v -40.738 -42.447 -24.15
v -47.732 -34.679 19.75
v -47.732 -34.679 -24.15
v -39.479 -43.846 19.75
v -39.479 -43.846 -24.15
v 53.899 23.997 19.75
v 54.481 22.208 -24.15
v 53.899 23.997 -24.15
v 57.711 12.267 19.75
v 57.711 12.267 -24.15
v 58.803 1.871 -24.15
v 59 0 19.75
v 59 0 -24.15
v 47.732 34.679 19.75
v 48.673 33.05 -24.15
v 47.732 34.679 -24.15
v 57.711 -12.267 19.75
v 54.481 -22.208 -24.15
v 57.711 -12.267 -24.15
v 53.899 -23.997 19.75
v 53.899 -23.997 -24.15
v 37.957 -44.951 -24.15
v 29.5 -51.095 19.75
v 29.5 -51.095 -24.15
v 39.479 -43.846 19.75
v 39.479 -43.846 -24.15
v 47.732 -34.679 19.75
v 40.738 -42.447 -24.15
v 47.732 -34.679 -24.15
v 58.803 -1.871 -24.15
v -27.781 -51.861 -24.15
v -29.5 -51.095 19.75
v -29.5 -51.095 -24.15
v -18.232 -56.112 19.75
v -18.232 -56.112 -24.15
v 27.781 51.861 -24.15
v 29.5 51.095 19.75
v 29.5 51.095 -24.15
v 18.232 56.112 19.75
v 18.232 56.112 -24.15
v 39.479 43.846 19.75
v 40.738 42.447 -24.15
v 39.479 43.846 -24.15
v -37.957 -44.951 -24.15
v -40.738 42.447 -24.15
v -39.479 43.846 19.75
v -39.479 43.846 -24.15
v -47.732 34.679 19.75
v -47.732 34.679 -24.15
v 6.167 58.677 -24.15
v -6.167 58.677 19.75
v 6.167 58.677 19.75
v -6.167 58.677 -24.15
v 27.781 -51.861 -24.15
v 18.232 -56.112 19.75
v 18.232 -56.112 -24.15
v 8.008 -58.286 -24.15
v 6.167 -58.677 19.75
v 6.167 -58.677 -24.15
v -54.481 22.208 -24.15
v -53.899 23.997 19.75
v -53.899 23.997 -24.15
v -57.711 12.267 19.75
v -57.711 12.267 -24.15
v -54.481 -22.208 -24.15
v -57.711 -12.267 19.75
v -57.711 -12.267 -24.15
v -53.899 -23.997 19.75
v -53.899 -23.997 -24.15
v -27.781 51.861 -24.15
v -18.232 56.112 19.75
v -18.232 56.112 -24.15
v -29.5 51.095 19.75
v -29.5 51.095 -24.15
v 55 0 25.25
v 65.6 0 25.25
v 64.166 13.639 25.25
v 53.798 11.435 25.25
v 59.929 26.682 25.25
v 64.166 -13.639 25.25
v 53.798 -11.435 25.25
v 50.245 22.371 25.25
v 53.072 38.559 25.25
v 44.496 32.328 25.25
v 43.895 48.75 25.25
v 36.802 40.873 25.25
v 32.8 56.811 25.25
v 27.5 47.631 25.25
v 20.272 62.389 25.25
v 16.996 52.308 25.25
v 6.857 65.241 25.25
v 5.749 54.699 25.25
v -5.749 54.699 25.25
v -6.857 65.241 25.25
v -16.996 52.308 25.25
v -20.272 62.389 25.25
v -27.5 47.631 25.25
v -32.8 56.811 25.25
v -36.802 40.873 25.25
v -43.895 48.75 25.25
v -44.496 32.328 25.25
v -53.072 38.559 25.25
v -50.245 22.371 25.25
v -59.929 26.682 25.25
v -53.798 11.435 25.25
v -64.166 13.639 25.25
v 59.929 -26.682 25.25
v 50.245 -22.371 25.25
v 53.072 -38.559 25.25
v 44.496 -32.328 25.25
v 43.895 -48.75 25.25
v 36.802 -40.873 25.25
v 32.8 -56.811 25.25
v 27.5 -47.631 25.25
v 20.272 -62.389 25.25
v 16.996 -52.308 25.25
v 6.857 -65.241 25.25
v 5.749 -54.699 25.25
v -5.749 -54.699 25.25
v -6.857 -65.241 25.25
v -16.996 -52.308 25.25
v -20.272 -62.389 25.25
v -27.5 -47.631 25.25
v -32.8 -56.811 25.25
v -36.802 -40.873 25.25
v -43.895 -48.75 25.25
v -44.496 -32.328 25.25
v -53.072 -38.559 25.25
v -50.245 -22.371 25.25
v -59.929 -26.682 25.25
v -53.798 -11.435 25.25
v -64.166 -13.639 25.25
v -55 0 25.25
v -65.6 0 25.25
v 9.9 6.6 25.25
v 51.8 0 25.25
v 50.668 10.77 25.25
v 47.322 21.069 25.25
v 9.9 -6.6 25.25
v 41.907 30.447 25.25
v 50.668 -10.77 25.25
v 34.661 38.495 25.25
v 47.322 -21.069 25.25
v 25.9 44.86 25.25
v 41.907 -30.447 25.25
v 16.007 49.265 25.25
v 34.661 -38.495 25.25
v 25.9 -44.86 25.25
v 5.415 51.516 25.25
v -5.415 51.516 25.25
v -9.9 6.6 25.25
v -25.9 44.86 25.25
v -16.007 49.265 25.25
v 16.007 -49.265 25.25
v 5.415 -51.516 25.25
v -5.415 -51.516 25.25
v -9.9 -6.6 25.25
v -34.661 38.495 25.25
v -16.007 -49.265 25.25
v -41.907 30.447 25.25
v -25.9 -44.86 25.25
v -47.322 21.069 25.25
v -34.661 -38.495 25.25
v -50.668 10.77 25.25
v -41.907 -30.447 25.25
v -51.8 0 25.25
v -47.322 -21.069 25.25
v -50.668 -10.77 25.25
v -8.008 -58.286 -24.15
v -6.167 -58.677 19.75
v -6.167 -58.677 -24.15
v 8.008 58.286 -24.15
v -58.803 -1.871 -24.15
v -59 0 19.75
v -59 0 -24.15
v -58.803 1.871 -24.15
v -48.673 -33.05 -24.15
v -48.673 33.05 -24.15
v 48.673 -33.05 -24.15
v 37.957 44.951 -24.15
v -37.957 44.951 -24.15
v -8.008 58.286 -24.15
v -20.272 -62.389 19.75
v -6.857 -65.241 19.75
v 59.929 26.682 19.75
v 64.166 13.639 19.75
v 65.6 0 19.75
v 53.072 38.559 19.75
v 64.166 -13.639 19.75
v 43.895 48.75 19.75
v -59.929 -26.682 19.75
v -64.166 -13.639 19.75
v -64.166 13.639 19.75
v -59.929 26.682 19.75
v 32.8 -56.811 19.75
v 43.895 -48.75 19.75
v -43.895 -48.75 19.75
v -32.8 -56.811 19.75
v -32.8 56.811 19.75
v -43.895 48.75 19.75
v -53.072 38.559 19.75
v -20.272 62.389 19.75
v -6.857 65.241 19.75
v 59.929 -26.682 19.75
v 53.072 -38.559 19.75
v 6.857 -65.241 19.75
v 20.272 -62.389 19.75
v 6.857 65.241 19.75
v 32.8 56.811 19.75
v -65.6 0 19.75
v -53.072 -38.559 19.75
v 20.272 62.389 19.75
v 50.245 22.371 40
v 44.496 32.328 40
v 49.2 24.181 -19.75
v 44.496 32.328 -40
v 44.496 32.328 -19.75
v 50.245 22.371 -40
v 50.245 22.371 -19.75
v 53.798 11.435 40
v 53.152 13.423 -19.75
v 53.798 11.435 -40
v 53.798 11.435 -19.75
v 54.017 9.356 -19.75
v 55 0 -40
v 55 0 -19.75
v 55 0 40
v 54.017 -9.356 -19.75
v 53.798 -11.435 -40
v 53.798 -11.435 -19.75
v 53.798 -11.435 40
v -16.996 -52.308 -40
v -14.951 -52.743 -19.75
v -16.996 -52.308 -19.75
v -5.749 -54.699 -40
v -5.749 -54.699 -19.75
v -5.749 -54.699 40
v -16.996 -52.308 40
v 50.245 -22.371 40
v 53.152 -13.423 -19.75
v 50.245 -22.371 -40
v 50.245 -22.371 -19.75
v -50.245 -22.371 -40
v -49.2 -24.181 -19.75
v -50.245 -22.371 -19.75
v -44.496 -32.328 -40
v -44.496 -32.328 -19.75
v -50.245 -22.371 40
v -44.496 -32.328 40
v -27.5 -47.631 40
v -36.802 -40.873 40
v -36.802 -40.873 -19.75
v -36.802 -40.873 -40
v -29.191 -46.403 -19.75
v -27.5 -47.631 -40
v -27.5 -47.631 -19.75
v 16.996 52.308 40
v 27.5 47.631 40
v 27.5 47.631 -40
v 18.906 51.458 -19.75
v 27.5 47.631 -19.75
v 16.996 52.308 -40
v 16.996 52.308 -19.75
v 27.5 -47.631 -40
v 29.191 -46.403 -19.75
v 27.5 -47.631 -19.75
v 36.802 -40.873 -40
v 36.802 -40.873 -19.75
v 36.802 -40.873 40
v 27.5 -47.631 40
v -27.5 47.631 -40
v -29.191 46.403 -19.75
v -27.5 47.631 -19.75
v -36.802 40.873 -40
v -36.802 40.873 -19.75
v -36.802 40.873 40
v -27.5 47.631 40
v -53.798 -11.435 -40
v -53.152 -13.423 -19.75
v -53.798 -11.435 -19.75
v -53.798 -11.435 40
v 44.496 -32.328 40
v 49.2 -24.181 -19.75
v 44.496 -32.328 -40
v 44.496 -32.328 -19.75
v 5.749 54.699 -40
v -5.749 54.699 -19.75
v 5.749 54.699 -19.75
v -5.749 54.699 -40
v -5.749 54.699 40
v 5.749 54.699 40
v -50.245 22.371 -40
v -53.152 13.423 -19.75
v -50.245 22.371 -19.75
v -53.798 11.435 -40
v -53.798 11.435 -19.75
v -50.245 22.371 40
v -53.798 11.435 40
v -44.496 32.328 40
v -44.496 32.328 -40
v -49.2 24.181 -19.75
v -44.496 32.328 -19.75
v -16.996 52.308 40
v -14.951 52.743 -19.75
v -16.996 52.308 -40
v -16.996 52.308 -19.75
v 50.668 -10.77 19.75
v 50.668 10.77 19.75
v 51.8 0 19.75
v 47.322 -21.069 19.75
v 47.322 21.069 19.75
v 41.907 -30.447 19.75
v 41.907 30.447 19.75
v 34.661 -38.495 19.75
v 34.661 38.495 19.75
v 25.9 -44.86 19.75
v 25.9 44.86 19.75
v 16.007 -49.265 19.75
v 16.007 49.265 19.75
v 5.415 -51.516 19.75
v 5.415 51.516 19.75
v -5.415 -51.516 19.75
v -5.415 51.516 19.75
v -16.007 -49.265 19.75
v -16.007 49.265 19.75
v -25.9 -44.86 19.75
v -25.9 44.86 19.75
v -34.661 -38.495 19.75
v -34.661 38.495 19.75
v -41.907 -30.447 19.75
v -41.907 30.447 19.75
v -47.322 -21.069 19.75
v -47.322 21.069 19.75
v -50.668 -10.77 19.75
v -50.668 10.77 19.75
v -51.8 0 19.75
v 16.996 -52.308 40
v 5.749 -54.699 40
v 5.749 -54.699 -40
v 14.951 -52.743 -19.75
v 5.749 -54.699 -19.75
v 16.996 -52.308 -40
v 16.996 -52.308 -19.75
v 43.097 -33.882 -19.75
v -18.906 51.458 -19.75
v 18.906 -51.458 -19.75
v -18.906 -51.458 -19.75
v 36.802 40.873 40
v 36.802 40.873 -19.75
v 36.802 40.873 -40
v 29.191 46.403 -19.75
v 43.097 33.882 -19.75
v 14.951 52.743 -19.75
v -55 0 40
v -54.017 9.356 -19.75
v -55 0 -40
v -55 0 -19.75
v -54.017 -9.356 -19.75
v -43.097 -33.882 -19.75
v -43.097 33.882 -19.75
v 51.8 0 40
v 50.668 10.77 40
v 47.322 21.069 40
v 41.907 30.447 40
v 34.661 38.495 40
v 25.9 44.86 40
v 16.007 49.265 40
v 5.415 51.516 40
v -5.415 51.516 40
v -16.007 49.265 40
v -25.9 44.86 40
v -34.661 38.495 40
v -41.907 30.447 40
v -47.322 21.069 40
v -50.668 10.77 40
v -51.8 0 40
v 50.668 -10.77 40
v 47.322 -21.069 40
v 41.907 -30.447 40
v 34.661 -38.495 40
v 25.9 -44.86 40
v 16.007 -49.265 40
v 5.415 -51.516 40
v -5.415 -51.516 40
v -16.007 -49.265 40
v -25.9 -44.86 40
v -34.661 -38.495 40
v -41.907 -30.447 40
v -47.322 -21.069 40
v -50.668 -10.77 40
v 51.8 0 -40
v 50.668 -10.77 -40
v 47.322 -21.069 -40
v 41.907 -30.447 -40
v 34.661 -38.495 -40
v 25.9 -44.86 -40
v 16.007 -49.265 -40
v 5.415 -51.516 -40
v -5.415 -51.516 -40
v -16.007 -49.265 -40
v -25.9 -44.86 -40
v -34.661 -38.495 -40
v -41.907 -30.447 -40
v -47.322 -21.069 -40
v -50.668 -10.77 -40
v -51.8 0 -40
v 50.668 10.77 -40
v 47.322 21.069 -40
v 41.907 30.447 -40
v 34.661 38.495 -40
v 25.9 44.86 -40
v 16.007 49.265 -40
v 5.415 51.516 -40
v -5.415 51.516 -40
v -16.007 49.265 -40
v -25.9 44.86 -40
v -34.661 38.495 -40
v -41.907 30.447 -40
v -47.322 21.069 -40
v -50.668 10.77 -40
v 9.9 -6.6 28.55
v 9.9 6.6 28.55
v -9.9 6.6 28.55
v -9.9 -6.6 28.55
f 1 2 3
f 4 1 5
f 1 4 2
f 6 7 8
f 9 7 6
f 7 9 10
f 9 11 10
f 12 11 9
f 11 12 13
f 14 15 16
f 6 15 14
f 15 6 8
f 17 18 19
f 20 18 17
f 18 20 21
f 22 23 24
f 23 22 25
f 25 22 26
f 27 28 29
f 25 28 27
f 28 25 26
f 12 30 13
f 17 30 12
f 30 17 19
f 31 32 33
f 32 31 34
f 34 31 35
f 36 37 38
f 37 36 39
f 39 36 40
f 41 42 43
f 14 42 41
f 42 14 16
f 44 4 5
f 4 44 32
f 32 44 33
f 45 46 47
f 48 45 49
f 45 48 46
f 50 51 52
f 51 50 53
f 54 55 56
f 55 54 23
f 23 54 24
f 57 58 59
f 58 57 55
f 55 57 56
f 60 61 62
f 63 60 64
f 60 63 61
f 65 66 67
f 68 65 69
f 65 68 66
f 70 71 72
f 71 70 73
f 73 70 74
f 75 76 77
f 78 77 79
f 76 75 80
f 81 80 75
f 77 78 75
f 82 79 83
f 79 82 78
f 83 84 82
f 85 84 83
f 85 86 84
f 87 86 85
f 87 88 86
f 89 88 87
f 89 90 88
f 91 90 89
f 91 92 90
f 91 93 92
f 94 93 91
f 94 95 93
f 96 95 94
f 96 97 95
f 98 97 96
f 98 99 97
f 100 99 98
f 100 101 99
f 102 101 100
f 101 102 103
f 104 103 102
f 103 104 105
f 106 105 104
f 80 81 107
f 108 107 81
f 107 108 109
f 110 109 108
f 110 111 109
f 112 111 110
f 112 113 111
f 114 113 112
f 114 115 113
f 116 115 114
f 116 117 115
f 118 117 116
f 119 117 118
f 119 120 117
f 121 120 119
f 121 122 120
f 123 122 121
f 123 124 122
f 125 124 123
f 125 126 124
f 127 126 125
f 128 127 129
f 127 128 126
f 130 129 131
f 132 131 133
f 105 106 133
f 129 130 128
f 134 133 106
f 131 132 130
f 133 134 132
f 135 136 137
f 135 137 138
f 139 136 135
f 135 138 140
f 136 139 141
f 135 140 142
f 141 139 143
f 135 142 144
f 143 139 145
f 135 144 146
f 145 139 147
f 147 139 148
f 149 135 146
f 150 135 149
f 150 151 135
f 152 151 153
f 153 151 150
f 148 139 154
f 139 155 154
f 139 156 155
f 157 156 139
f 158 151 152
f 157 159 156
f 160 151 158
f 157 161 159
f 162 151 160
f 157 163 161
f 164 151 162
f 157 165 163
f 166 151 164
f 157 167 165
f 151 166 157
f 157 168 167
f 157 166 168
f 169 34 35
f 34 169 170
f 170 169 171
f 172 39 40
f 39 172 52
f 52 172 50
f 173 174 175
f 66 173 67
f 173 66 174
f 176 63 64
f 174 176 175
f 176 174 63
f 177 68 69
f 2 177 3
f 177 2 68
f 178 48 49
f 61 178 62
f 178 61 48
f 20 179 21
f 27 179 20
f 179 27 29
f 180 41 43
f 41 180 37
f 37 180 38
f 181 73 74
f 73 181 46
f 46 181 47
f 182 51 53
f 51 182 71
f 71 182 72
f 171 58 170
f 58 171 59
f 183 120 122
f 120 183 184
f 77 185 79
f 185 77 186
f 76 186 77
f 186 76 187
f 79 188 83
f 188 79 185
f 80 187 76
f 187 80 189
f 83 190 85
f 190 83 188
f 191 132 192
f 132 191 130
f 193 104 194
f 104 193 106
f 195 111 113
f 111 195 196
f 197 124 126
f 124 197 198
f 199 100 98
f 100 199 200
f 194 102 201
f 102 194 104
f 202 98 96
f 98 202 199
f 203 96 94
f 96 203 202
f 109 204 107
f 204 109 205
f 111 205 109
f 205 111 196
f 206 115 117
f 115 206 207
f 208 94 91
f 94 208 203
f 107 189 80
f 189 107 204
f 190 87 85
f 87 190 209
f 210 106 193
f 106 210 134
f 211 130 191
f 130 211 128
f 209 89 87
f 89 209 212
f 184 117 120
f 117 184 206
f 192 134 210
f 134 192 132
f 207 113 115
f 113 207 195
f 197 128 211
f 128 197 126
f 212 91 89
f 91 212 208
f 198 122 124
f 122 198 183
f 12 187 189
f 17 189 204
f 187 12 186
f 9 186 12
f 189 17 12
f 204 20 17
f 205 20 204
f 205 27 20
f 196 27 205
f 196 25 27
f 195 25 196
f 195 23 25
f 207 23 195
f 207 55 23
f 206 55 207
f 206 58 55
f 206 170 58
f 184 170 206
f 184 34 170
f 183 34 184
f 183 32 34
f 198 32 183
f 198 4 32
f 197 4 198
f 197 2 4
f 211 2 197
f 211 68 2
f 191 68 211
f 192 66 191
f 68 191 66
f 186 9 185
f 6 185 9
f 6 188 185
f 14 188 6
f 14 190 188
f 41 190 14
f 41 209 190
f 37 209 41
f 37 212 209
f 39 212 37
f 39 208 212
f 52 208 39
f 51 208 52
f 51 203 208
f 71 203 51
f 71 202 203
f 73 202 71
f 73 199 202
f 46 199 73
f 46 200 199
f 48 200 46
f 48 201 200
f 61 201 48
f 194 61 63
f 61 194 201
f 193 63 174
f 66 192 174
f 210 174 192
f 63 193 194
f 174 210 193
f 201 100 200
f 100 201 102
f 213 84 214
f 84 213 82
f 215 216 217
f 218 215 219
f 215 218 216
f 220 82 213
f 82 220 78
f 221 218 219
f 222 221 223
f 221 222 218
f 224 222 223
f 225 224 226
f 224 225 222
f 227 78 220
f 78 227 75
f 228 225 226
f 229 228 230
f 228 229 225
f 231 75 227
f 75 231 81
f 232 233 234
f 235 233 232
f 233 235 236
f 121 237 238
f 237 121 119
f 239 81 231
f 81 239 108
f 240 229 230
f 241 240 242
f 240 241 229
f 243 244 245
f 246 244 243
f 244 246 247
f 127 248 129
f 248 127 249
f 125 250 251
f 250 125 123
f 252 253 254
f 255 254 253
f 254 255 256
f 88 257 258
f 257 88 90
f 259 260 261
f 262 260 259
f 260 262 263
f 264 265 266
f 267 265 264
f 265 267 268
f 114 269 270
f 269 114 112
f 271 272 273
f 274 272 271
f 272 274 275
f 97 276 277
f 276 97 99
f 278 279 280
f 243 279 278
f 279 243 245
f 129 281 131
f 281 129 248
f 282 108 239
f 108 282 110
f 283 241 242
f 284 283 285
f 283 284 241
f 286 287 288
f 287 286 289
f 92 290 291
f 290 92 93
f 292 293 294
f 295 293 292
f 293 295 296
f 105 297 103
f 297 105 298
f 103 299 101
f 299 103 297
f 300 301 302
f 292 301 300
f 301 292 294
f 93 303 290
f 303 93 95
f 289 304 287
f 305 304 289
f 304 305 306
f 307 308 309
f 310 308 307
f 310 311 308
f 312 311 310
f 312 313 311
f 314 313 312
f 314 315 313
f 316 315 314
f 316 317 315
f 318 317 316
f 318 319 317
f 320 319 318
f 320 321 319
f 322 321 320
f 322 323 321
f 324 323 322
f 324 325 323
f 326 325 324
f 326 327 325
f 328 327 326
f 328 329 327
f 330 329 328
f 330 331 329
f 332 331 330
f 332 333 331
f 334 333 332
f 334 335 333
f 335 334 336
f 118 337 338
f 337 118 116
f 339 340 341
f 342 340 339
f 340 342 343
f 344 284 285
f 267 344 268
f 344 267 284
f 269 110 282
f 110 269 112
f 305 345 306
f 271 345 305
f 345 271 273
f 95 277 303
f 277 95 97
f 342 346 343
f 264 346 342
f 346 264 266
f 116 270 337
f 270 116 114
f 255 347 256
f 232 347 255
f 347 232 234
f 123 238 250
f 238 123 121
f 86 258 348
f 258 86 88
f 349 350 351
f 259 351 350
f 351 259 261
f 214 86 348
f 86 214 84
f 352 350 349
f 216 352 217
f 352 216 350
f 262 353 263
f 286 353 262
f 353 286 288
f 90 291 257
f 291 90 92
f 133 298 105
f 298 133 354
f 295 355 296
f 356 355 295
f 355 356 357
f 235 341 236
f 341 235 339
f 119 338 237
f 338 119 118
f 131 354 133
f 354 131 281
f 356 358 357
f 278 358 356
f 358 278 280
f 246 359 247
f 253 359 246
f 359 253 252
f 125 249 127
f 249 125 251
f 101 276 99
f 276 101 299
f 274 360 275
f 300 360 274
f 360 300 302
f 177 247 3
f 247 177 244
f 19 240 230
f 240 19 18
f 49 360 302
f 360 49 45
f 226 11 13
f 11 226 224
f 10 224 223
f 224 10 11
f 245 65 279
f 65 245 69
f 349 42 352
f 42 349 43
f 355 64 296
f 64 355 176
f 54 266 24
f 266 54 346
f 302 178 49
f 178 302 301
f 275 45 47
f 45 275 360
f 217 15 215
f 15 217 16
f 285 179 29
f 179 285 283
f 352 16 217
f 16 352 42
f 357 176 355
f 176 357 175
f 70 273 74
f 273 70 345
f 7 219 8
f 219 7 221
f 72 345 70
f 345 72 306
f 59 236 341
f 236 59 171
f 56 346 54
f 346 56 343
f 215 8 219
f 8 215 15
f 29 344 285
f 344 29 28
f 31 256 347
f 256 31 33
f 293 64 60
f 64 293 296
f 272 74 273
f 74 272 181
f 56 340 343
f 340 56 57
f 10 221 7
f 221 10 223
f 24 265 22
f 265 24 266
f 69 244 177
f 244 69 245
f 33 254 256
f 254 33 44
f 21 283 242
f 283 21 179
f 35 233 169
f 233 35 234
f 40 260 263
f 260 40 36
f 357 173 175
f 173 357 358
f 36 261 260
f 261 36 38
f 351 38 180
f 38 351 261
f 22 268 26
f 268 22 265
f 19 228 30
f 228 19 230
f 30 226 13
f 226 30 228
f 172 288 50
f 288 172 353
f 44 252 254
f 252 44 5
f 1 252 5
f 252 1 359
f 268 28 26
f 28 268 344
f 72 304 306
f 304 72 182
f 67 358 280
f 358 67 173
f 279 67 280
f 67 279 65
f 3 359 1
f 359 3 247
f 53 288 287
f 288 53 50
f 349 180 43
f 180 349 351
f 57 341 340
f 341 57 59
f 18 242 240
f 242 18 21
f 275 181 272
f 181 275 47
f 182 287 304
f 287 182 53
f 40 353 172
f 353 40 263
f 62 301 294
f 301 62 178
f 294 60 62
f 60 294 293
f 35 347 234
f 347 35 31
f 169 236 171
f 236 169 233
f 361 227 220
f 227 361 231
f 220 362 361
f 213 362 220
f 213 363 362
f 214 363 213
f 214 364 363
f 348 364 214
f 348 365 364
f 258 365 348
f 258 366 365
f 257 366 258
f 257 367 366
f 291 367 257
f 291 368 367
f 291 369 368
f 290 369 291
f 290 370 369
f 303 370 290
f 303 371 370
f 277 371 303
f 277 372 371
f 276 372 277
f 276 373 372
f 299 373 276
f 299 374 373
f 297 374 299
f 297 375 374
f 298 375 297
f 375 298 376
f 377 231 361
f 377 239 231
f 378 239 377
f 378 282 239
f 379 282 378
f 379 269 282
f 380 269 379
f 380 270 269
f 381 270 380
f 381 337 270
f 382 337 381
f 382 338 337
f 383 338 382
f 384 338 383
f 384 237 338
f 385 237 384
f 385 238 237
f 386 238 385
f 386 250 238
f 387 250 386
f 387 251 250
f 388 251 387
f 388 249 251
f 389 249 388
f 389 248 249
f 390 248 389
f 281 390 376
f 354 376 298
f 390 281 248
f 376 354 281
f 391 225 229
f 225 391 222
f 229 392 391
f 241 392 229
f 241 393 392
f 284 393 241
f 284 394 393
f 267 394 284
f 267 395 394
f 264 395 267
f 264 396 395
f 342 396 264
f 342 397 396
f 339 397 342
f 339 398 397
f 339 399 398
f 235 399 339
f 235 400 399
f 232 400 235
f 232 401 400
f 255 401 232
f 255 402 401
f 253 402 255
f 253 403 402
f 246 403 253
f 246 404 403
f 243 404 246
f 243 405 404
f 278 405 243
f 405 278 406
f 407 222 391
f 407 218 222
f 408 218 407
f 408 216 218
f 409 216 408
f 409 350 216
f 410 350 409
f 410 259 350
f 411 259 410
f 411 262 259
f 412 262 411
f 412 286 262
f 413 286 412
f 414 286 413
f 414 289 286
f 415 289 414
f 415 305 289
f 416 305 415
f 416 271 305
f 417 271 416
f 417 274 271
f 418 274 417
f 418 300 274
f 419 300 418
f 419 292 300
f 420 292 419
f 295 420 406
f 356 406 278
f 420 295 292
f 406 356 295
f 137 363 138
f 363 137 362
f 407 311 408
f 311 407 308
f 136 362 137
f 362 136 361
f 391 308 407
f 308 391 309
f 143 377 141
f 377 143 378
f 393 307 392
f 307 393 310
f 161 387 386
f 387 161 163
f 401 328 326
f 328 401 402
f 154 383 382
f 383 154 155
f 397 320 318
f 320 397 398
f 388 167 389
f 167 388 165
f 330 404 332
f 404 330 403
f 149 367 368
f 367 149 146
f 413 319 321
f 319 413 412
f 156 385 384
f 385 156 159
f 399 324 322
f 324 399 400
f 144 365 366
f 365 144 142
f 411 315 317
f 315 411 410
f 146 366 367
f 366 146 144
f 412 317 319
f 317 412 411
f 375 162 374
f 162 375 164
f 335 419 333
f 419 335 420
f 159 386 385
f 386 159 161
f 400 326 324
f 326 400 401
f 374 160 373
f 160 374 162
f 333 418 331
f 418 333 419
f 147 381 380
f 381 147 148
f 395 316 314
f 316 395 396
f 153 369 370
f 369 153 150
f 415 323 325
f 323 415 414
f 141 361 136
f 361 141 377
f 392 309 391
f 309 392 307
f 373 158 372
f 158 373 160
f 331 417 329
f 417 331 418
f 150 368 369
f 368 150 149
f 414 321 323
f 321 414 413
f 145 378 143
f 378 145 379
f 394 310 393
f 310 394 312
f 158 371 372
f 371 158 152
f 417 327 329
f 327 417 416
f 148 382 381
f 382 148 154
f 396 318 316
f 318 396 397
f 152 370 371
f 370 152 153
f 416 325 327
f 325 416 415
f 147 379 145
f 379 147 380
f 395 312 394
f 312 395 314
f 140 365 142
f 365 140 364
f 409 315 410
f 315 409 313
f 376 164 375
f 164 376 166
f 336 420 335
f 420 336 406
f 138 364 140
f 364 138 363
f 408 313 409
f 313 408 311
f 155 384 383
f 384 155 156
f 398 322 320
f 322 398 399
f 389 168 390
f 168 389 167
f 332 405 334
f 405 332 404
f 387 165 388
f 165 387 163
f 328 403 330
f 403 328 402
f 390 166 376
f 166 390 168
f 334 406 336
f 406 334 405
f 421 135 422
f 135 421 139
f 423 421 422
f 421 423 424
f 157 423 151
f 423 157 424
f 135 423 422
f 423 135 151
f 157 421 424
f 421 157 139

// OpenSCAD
// Parameters
primary_dimension_mm = 110; //[55:220:1]
pipe_od_mm = 110; //[55:220:1]
pipe_wall_mm = 3.2; //[1.6:6.4:0.1]
cap_wall_mm = 4; //[2:8:0.1]
cap_insertion_depth_mm = 45; //[22.5:90:1]
cap_top_thickness_mm = 5.5; //[2.75:11:0.5]
cap_flange_radial_mm = 6.6; //[3.3:13.2:0.2]
internal_stop_thickness_mm = 3; //[1.5:6:0.1]
internal_stop_radial_mm = 2.2; //[1.1:4.4:0.1]
lead_in_chamfer_depth_mm = 6.6; //[3.3:13.2:0.2]
interference_mm = 0.3; //[0.1:0.8:0.05]
interference_band_length_mm = 8.8; //[4.4:17.6:0.2]
interference_band_offset_from_mouth_mm = 11; //[5.5:22:0.5]
overlap_mm = 1; //[0.5:2:0.1]
pipe_length_ref_mm = 80; //[40:160:1]

// Ht Pipe - complete geometry
module ht_pipe() {
  color([0.0, 0.4, 0.2]) {
    difference() {
      cylinder(r=pipe_od_mm/2, h=pipe_length_ref_mm, center=true);
      translate([0, 0, -overlap_mm/2])
        cylinder(r=pipe_od_mm/2 - pipe_wall_mm, h=pipe_length_ref_mm + overlap_mm, center=true);
    }
  }
}

// Ht Cap - complete geometry
module ht_cap() {
  color([0.85, 0.85, 0.8]) {
    difference() {
      union() {
        translate([0, 0, 0])
          cylinder(r=pipe_od_mm/2 + cap_wall_mm, h=cap_insertion_depth_mm + cap_top_thickness_mm, center=true);
        translate([0, 0, cap_insertion_depth_mm/2])
          cylinder(r=pipe_od_mm/2 + cap_wall_mm + cap_flange_radial_mm, h=cap_top_thickness_mm, center=true);
      }
      translate([0, 0, -cap_top_thickness_mm/2 - overlap_mm/2])
        cylinder(r=pipe_od_mm/2, h=cap_insertion_depth_mm + overlap_mm, center=true);
      translate([0, 0, -(cap_insertion_depth_mm + cap_top_thickness_mm)/2 + internal_stop_thickness_mm/2 - overlap_mm/2])
        cylinder(r=pipe_od_mm/2 - internal_stop_radial_mm, h=internal_stop_thickness_mm + overlap_mm, center=true);
      translate([0, 0, -(cap_insertion_depth_mm + cap_top_thickness_mm)/2 + lead_in_chamfer_depth_mm/2])
        cylinder(r1=pipe_od_mm/2 + cap_wall_mm + overlap_mm, r2=pipe_od_mm/2 - overlap_mm, h=lead_in_chamfer_depth_mm, center=true);
      translate([0, 0, -(cap_insertion_depth_mm + cap_top_thickness_mm)/2 + interference_band_offset_from_mouth_mm + interference_band_length_mm/2])
        cylinder(r=pipe_od_mm/2 - interference_mm, h=interference_band_length_mm, center=true);
    }
  }
}

// Rd Box Cap - complete geometry
module rd_box_cap() {
  color([0.1, 0.1, 0.6]) {
    translate([0, 0, cap_insertion_depth_mm/2 + cap_top_thickness_mm/2])
      cube([primary_dimension_mm*0.18, primary_dimension_mm*0.12, primary_dimension_mm*0.06], center=true);
  }
}

// Assembly
module assembly() {
  ht_cap();
  ht_pipe();
  rd_box_cap();
}

assembly();
